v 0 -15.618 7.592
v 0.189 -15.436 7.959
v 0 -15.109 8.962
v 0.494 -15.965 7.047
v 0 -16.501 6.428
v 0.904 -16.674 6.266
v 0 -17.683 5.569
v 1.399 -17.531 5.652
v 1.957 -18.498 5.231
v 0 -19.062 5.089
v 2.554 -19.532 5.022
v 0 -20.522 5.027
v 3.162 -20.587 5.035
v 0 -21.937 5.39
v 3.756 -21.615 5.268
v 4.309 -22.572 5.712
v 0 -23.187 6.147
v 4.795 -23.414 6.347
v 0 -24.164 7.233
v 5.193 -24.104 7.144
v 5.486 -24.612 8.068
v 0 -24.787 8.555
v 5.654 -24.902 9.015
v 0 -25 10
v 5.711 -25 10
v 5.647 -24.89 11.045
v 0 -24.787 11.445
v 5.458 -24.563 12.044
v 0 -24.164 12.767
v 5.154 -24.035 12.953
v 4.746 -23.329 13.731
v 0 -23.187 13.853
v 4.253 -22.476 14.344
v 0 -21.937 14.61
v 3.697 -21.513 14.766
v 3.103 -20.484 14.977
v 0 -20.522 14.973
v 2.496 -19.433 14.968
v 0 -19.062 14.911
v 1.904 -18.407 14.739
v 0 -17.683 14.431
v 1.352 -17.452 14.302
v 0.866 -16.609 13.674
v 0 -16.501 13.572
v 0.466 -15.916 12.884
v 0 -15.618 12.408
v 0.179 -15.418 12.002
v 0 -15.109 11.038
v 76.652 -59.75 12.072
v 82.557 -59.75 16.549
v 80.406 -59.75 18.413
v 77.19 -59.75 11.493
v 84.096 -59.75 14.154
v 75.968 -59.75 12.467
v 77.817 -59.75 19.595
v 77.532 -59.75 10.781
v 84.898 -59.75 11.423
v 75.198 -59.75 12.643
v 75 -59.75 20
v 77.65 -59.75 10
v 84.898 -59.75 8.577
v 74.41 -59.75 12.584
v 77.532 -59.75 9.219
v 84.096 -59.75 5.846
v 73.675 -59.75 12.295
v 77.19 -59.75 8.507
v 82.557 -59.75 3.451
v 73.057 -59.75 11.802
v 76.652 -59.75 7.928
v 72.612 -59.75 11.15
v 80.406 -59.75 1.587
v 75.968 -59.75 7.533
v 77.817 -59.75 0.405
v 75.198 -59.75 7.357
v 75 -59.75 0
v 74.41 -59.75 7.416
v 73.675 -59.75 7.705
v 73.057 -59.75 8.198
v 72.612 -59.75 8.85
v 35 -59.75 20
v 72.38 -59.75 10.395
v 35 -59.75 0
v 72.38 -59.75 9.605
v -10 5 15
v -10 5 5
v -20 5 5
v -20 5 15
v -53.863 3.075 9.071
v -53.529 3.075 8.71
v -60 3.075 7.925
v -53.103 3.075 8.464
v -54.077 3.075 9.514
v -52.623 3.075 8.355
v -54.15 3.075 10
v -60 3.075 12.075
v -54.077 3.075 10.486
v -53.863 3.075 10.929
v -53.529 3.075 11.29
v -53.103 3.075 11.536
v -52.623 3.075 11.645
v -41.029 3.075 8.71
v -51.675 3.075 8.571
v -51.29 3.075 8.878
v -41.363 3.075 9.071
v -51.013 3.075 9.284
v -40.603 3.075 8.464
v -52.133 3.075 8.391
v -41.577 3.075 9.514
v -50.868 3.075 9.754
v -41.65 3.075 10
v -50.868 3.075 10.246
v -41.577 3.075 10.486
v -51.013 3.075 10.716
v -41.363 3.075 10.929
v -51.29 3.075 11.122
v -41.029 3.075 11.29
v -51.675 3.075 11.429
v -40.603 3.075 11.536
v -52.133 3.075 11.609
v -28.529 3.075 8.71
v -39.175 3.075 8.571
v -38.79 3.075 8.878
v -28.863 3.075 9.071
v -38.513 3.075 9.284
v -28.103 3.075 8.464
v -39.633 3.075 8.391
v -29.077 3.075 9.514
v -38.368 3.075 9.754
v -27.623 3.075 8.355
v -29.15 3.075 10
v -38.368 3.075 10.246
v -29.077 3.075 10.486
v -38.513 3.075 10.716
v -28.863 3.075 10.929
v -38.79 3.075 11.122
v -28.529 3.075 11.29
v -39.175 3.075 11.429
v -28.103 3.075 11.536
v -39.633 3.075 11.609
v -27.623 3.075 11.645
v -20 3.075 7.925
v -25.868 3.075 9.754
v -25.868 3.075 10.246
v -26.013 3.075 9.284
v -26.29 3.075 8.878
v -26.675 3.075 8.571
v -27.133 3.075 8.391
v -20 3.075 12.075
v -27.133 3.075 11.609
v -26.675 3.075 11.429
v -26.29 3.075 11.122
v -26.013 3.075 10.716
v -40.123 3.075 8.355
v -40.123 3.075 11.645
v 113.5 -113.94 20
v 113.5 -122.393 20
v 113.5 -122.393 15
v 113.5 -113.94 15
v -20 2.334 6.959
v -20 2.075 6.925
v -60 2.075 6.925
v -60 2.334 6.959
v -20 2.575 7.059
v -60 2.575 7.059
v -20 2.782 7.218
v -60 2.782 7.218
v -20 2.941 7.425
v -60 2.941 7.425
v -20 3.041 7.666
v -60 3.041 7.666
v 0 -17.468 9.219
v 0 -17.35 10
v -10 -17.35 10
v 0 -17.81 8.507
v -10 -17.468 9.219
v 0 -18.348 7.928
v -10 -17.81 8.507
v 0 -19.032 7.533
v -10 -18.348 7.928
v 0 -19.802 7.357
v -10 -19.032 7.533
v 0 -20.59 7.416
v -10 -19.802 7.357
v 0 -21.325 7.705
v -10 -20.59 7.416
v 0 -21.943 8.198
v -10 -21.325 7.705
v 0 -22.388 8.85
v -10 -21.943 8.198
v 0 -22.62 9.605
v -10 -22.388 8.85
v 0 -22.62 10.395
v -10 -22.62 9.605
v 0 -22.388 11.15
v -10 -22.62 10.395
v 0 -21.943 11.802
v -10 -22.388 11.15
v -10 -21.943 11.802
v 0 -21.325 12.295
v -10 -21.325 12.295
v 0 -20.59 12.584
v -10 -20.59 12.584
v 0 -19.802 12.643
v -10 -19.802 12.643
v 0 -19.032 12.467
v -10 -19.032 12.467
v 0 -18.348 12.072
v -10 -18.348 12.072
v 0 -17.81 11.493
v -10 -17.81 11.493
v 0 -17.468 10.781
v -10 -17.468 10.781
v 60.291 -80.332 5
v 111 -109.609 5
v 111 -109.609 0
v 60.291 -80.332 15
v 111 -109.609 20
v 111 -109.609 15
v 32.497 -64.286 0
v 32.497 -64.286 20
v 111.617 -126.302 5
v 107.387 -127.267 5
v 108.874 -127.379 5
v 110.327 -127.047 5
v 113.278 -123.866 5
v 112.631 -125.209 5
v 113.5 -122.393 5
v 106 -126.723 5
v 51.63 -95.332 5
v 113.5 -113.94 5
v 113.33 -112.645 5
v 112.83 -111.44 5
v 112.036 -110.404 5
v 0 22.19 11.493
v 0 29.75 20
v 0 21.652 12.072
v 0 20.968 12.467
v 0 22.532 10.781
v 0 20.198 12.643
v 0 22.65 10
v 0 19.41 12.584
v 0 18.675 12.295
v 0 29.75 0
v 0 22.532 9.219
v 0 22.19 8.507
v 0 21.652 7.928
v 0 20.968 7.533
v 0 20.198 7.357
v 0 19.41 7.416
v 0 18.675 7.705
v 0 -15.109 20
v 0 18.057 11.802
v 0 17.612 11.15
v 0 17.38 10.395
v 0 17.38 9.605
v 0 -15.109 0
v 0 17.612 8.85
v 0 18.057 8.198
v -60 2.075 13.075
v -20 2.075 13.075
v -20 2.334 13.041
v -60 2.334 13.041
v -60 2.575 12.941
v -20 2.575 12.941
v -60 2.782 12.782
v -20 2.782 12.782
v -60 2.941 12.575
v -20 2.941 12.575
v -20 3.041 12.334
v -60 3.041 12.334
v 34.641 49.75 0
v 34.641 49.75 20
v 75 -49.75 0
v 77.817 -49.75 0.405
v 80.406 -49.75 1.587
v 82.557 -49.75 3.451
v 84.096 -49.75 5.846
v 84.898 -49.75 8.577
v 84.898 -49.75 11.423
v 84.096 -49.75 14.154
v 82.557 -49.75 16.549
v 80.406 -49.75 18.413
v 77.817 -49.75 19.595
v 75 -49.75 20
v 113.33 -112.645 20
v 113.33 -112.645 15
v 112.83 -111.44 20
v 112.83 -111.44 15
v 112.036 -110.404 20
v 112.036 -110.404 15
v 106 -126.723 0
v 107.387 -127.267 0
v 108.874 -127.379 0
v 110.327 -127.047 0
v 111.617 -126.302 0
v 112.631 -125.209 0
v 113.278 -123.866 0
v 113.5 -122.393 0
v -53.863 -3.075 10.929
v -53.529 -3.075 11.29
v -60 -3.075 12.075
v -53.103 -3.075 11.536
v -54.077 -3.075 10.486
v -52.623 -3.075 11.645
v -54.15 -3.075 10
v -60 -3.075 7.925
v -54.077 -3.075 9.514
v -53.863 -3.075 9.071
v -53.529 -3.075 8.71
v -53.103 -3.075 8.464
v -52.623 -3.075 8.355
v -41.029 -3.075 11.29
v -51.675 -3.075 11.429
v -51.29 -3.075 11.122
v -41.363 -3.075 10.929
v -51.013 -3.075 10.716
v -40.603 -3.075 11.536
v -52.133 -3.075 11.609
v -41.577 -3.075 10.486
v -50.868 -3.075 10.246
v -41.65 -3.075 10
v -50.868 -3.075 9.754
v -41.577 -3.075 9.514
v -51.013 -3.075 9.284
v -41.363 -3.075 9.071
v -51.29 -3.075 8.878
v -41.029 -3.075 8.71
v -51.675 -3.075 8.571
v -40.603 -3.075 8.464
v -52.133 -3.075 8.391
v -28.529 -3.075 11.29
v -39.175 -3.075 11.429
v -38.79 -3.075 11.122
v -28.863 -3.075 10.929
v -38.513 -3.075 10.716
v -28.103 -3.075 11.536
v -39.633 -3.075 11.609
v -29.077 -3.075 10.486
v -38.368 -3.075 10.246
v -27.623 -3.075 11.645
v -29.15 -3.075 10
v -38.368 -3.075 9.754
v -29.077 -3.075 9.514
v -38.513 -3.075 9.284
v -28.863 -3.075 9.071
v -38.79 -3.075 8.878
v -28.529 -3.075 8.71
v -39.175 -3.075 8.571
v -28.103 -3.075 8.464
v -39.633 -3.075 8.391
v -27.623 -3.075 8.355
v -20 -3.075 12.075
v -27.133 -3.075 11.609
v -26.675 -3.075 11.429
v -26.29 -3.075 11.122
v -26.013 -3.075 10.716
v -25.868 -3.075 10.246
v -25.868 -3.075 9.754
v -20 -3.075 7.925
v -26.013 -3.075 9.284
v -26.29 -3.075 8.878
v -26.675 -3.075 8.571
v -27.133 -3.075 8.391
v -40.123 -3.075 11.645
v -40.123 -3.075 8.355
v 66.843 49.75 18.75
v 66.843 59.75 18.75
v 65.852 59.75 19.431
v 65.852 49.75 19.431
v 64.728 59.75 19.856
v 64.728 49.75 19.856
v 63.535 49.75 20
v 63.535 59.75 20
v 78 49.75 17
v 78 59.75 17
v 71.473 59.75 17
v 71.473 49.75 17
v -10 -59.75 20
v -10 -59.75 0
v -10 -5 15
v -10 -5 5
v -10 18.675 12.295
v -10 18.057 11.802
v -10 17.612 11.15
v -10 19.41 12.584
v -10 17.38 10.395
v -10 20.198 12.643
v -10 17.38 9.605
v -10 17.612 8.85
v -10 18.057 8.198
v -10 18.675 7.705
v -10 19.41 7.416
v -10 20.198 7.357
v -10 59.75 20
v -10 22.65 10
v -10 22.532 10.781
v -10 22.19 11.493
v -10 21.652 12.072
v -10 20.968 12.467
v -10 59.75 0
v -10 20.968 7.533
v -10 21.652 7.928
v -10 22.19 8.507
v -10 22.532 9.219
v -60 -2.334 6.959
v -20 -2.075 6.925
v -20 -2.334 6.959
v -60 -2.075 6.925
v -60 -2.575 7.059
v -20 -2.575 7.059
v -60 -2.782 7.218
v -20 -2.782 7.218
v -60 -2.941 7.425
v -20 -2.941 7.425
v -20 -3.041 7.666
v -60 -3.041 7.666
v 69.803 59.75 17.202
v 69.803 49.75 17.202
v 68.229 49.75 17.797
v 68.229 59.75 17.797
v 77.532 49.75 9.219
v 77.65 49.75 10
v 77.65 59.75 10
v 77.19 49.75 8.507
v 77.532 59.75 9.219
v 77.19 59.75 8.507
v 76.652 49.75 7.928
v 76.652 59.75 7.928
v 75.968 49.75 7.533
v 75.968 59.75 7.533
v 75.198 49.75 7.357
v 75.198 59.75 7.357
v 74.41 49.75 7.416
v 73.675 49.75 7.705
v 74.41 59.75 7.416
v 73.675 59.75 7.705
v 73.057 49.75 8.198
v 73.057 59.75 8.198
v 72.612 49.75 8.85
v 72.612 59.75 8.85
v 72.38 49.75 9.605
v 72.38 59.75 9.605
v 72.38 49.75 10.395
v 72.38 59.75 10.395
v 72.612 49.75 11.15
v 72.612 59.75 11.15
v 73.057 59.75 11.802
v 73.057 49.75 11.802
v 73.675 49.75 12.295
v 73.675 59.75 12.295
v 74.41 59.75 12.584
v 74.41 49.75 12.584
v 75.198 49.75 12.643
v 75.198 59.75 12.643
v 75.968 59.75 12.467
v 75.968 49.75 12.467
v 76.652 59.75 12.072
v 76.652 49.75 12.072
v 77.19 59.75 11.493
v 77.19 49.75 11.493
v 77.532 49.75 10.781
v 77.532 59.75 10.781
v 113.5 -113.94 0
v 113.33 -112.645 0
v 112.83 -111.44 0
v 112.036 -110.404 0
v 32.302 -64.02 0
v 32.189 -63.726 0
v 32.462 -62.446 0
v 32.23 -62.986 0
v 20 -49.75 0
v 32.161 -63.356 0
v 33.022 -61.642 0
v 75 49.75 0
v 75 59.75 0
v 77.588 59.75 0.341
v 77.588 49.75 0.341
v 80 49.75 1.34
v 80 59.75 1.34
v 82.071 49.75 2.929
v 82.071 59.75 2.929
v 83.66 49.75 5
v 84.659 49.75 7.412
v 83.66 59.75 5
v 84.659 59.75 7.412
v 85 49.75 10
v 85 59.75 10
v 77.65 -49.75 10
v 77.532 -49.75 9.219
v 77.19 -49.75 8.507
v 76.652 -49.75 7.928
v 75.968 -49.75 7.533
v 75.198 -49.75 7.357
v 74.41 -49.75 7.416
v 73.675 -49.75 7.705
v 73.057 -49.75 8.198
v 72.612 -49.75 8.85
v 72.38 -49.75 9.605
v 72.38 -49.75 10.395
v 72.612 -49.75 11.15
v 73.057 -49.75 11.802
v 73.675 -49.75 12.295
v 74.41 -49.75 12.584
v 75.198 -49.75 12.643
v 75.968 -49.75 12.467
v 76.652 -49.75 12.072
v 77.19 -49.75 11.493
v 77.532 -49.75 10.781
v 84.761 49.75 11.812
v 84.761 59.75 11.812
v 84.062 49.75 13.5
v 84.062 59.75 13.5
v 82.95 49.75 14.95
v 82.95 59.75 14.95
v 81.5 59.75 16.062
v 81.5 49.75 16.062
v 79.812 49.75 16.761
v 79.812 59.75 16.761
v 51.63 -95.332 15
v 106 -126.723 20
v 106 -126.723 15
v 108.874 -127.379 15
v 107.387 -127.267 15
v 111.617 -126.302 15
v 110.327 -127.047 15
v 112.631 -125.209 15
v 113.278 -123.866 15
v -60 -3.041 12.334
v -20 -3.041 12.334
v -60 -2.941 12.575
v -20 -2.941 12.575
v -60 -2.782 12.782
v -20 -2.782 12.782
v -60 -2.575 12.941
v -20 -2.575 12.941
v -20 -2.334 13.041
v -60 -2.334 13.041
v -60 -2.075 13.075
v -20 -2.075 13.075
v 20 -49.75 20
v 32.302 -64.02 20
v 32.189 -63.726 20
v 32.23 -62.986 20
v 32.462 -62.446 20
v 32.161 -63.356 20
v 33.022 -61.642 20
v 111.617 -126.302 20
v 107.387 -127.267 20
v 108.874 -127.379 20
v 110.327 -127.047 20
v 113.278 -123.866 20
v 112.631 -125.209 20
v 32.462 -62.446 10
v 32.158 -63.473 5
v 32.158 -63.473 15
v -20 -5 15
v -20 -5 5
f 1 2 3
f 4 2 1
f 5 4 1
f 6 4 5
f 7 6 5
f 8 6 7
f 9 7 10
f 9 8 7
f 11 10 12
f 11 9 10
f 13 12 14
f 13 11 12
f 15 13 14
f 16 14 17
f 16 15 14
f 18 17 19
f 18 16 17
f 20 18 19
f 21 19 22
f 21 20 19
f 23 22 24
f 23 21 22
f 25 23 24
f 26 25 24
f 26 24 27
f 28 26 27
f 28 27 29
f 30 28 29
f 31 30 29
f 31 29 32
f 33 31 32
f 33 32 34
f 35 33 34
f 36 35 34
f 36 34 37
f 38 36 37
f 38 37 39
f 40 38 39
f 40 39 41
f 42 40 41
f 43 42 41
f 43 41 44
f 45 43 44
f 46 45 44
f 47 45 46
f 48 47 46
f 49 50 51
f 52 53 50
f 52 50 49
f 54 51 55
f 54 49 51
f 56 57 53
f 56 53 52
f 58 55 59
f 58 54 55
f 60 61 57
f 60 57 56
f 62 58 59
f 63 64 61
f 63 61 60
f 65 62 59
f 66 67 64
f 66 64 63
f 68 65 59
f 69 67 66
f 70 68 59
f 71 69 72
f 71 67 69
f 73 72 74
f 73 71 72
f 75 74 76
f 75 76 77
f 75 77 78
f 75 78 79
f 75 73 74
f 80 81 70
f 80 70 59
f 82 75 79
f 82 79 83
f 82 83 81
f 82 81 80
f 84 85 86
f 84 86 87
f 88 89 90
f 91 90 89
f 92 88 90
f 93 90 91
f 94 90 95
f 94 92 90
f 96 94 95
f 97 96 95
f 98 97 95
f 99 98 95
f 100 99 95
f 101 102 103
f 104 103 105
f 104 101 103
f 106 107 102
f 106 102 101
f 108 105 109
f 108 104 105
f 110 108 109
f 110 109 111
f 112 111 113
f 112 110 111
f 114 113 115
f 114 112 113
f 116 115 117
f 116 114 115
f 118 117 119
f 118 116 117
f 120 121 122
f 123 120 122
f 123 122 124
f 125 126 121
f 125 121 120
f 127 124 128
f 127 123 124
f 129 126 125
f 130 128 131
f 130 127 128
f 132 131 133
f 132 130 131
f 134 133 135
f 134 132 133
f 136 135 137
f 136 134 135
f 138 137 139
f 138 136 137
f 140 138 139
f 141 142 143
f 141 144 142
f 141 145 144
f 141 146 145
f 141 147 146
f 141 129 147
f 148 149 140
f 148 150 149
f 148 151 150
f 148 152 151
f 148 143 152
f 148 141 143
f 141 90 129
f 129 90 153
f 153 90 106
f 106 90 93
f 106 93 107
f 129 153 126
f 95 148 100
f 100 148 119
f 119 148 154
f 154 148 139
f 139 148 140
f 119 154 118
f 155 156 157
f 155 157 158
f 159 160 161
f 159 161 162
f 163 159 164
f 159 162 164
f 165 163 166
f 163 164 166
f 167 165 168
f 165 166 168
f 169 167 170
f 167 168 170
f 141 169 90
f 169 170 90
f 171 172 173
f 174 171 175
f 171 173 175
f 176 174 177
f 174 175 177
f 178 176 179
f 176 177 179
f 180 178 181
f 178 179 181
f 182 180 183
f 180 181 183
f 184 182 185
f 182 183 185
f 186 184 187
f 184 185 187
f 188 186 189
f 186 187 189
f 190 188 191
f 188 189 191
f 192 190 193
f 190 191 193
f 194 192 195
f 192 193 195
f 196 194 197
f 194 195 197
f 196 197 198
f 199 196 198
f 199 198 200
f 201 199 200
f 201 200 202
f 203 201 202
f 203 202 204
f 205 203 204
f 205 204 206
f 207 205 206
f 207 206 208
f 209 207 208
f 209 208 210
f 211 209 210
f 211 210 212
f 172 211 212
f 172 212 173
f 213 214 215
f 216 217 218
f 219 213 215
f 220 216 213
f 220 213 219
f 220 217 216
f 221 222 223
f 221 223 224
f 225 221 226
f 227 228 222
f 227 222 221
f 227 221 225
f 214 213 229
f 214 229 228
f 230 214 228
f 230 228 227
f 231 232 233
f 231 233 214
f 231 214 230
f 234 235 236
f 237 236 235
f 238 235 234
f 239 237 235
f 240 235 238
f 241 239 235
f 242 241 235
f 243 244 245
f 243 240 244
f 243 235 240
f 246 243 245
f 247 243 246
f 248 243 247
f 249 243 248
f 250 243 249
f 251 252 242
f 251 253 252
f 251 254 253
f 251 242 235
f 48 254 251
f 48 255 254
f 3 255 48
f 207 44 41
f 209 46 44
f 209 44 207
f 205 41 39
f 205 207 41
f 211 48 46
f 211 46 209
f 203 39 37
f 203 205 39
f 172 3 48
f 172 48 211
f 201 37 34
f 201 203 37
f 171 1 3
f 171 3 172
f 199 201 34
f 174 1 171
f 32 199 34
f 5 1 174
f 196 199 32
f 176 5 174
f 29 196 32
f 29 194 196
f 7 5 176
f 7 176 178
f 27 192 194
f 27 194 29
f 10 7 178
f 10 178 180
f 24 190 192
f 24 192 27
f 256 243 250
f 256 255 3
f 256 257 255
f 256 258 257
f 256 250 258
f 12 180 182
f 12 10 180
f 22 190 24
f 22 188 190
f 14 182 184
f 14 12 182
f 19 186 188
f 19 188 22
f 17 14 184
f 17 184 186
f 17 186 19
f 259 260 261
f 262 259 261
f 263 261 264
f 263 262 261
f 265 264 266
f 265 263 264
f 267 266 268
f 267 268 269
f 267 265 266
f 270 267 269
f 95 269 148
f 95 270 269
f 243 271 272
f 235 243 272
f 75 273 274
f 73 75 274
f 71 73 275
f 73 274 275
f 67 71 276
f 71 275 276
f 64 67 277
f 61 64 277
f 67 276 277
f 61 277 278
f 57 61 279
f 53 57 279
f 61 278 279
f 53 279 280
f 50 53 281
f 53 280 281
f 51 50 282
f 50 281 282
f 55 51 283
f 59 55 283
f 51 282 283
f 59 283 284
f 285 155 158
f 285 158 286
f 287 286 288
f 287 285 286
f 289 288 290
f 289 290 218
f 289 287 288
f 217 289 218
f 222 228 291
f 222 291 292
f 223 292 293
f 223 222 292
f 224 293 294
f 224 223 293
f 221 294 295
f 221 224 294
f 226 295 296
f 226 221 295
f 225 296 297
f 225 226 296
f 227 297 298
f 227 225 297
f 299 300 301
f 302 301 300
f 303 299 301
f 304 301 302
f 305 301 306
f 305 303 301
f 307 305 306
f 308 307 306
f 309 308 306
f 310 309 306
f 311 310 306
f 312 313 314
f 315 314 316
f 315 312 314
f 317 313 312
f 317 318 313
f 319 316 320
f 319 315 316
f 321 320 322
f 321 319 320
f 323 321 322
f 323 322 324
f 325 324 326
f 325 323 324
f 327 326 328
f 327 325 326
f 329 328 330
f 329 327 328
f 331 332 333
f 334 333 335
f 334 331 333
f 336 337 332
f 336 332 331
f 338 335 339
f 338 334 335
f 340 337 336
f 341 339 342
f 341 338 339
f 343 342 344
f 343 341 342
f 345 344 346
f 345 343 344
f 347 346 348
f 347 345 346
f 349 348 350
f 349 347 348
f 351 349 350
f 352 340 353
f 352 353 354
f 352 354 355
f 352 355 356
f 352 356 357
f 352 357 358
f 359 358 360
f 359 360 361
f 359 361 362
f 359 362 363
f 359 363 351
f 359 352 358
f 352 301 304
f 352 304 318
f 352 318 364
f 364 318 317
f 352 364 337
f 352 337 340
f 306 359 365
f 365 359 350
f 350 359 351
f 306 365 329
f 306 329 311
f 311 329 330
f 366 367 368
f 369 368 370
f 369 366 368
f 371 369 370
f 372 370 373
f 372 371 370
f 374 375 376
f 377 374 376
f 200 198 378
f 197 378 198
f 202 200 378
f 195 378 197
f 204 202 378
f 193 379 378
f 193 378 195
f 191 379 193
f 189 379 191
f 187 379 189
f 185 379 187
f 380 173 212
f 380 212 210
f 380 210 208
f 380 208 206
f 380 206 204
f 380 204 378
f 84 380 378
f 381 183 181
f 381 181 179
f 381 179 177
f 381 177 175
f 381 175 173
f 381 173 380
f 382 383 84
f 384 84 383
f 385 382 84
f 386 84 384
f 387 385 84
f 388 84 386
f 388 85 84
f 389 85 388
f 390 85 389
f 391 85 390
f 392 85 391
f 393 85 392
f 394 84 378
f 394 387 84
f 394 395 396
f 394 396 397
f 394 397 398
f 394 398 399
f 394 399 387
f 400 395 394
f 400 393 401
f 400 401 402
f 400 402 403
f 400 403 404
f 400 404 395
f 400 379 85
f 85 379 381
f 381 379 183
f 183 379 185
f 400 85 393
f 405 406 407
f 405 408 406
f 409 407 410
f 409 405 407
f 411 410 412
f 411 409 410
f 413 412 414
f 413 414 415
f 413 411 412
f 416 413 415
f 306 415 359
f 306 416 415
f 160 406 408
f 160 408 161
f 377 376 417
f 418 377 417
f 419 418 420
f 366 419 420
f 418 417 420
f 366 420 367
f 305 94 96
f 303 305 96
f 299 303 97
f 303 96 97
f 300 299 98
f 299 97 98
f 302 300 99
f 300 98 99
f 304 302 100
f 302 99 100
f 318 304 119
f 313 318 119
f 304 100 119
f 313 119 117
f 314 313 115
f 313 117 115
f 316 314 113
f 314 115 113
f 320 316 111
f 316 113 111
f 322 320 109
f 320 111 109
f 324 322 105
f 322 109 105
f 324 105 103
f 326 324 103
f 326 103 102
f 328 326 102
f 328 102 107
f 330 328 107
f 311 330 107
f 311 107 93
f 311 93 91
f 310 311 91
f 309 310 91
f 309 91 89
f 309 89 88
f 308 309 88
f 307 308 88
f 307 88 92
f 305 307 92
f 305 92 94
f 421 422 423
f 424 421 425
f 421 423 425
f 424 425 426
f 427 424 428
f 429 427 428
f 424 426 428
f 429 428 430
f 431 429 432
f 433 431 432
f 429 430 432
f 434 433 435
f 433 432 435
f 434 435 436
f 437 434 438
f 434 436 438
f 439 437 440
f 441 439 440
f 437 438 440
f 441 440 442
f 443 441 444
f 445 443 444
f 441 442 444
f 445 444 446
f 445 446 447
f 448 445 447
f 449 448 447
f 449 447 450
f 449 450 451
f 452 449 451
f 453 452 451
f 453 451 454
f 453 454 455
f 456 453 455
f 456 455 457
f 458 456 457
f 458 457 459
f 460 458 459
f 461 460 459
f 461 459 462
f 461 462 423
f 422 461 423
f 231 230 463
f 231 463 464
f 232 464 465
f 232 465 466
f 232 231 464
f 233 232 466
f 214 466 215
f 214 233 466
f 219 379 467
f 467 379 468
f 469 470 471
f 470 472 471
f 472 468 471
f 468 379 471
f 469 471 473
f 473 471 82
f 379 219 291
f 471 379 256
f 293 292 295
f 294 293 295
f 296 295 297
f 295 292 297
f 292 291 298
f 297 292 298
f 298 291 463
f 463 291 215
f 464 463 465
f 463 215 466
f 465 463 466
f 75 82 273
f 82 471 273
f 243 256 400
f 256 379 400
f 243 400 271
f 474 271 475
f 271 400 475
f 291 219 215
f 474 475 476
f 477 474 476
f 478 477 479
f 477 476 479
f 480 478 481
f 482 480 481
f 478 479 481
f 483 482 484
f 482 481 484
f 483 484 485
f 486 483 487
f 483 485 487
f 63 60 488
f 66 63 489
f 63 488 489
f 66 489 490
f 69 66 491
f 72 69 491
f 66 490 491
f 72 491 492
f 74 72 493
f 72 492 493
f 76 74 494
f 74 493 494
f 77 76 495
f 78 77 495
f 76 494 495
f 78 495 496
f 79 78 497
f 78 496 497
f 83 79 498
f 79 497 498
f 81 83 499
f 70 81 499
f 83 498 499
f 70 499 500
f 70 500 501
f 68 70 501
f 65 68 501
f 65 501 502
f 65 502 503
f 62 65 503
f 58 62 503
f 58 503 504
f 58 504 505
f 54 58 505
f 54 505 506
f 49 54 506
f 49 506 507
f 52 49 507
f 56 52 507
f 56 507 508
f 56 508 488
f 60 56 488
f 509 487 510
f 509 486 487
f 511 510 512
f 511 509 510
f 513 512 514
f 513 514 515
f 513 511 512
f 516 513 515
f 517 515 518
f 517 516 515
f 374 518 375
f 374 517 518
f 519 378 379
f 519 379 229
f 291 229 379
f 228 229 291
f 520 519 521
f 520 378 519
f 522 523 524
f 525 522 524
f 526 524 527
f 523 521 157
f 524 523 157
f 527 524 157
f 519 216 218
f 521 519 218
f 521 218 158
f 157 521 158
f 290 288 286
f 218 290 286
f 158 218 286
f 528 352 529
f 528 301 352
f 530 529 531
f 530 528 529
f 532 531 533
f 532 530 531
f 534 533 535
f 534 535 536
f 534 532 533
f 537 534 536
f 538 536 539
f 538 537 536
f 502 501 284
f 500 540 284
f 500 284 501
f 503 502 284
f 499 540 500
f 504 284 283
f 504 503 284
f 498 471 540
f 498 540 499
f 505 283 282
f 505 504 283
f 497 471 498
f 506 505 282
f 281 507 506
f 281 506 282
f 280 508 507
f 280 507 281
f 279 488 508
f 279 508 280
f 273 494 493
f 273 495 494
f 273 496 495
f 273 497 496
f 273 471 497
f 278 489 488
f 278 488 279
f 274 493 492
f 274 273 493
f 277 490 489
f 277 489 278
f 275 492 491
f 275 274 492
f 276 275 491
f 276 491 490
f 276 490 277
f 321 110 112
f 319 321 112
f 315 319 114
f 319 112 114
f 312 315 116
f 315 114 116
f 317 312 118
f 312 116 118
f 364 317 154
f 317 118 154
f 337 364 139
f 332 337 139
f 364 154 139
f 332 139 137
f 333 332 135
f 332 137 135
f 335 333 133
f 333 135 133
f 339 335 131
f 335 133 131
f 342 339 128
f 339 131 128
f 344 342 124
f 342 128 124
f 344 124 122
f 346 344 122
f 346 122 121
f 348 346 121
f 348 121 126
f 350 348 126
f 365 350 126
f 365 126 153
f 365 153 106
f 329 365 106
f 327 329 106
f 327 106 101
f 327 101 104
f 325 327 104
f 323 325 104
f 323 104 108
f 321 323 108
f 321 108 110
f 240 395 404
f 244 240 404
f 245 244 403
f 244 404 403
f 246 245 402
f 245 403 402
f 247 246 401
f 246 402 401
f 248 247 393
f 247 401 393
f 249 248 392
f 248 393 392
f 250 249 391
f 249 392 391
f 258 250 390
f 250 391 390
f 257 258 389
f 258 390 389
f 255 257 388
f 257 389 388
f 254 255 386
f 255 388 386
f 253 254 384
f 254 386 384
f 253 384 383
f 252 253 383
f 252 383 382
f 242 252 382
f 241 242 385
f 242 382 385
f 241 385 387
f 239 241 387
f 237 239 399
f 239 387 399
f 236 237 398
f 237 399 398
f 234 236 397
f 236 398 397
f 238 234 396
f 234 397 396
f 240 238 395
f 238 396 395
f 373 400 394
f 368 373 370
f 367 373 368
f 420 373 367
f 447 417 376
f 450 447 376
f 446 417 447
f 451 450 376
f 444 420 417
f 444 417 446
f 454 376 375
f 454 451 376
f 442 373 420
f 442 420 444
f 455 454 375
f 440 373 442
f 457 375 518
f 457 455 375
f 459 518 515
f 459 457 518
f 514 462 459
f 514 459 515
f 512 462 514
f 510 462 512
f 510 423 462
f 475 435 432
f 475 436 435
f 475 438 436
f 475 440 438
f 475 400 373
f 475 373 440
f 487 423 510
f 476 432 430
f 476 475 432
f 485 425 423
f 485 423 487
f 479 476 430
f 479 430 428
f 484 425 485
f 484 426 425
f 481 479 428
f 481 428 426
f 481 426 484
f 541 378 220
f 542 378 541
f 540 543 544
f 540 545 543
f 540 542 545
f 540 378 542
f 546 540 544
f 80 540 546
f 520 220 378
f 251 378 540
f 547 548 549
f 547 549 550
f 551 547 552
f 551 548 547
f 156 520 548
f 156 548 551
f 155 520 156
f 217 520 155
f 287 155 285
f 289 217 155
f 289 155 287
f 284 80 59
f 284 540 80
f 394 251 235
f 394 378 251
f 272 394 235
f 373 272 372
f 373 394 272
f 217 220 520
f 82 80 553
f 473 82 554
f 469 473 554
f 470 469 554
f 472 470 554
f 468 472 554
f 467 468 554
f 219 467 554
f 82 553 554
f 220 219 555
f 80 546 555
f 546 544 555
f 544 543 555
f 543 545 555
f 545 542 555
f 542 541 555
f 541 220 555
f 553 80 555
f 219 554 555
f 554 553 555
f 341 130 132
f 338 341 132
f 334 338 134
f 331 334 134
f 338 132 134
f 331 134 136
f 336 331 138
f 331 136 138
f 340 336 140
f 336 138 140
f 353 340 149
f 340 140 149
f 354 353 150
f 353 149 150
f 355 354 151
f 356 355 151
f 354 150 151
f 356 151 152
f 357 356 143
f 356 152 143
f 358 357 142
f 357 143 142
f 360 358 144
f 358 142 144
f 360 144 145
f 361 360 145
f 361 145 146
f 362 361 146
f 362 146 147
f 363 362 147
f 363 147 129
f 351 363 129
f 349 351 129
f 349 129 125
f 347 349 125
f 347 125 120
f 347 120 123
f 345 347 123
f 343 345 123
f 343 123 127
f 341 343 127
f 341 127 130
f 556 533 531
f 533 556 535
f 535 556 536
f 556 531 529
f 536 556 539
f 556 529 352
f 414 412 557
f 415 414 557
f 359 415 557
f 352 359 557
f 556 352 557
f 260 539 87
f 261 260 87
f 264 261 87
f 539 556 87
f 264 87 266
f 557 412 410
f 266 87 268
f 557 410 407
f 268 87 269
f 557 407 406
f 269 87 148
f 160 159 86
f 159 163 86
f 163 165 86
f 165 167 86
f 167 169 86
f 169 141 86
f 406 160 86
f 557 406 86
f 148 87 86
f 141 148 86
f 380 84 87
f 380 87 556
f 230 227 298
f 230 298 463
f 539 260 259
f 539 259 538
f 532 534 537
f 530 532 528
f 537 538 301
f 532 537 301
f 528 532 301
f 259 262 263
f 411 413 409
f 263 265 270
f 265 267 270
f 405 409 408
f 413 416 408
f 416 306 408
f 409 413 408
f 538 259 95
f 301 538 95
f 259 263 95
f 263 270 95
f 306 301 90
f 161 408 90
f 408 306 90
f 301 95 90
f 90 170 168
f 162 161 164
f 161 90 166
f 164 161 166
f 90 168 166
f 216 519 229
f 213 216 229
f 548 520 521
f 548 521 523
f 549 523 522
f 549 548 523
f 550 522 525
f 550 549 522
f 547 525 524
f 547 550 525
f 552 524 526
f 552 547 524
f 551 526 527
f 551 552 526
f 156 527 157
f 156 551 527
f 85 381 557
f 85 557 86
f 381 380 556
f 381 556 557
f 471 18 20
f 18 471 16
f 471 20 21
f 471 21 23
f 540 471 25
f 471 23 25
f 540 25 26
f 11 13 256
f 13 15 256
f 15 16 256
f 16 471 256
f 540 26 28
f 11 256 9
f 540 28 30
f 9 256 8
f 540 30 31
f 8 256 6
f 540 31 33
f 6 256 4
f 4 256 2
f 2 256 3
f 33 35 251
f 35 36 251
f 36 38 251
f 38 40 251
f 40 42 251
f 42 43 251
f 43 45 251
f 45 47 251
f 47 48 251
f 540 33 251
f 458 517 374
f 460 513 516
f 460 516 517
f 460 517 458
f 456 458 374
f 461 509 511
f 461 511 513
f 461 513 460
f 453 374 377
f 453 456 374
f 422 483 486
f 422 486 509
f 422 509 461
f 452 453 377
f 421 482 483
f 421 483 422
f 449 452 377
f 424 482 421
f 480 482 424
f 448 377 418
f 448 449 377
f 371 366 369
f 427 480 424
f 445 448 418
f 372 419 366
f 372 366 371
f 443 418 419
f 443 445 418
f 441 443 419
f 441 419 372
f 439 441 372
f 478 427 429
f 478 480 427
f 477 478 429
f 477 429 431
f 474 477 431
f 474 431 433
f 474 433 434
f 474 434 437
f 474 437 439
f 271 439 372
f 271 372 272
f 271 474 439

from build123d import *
from OCP.BRepFilletAPI import BRepFilletAPI_MakeChamfer, BRepFilletAPI_MakeFillet

# Parameters (mm, degrees)
EXTRUDE_1_DEPTH     = 20
EXTRUDE_2_DEPTH     = 10
EXTRUDE_START       = 10
EXTRUDE_3_DEPTH     = 40
CUT_EXTRUDE_1_DEPTH = 149.00422291272636
FILLET_1_R          = 1
SKETCH_7_R          = 1.6500000000000021
SKETCH_7_R_2        = 1.6499999999999988
CUT_EXTRUDE_2_DEPTH = 108.57314081591156
CHAMFER_1_SIZE      = 20.000000000000007
CHAMFER_1_SIZE2     = 34.64101615137772
CUT_EXTRUDE_3_REACH = 150.004
FILLET_2_R1         = 5
FILLET_2_R2         = 7
CUT_EXTRUDE_4_REACH = 115.996
CUT_EXTRUDE_START   = -15.710581
CUT_EXTRUDE_5_DEPTH = 5.7105809999999995
BOSS_EXTRUDE1_DEPTH = 20.000000000000004
SKETCH4_W           = 72.89110280441945
SKETCH4_H           = 10.000000000000005
CUT_EXTRUDE1_DEPTH  = 29.000000000000004


with BuildPart() as part:
    # 草图1 → 凸台-拉伸1 (new body)
    with BuildSketch(Plane.XY):
        Polygon((-1.953e-14, 49.75), (1.093e-14, -49.75), (85.00000000000001, -49.74999999999995), (85.00000000000001, -59.74999999999995), (-9.999999999999986, -59.74999999999995), (-9.999999999999995, 59.749999999999986), (85, 59.75000000000001), (84.99999999999999, 49.75), align=None)
    extrude(amount=EXTRUDE_1_DEPTH)

    # 草图3 → 凸台-拉伸2 (add)
    # profile 1 of 2: a face of its own
    with BuildSketch(Plane.ZY.offset(9.99999999999999)):
        Polygon((15, 5.000000000000008), (15, -4.999999999999993), (5.000000000000002, -4.999999999999993), (5, 5.000000000000007), align=None)
        Polygon((6.925000000000001, 3.075000000000007), (6.925000000000002, -3.074999999999993), (13.075, -3.074999999999993), (13.075, 3.075000000000007), align=None, mode=Mode.SUBTRACT)
    # profile 2 of 2: a face of its own
    with BuildSketch(Plane.ZY.offset(9.99999999999999)):
        Polygon((6.925000000000001, 3.075000000000007), (13.075, 3.075000000000007), (13.075, -3.074999999999993), (6.925000000000002, -3.074999999999993), align=None)
    extrude(amount=EXTRUDE_2_DEPTH)

    # 草图3<3> → 凸台-拉伸3 (add)
    with BuildSketch(Plane.ZY.offset(9.99999999999999).offset(EXTRUDE_START)):
        Polygon((6.925000000000001, 3.075000000000007), (13.075, 3.075000000000007), (13.075, -3.074999999999993), (6.925000000000002, -3.074999999999993), align=None)
    extrude(amount=EXTRUDE_3_DEPTH)

    # 草图5 → 切除-拉伸1 (cut, through all)
    with BuildSketch(Plane(origin=(-1.309e-14, 59.749999999999986, 0), x_dir=(1, 2.3e-16, 0), z_dir=(-2.3e-16, 1, 0))):
        with BuildLine():
            ThreePointArc((72.34999999999964, -10), (74.99999999999964, -12.65), (77.64999999999965, -10))
            Line((77.64999999999965, -9.99999999999999), (72.34999999999964, -9.999999999999991))
        make_face()
        with BuildLine():
            Line((72.34999999999964, -9.999999999999991), (77.64999999999965, -9.99999999999999))
            ThreePointArc((77.64999999999965, -10), (74.99999999999964, -7.35), (72.34999999999964, -9.999999999999998))
        make_face()
        with BuildLine():
            Line((85.00000000000001, -20), (85.00000000000001, -9.999999999999995))
            ThreePointArc((84.99999999999964, -10.000000000000002), (82.07106781186489, -17.071067811865692), (74.99999999999903, -19.999999999999993))
            Line((74.99999999999903, -20), (85.00000000000001, -20))
        make_face()
        with BuildLine():
            ThreePointArc((74.99999999999908, -5.33e-15), (82.07106781186492, -2.928932188134328), (84.99999999999964, -10))
            Line((85.00000000000001, -9.999999999999995), (85.00000000000001, 0))
            Line((85.00000000000001, 0), (74.99999999999908, 0))
        make_face()
    extrude(amount=-CUT_EXTRUDE_1_DEPTH, mode=Mode.SUBTRACT)

    # 圆角1
    fillet_1_edges = [part.edges().sort_by_distance(p)[0] for p in [
        (-39.999999999999986, -3.0749999999999953, 6.925000000000002),
        (-39.999999999999986, -3.0749999999999953, 13.075),
        (-39.999999999999986, 3.0750000000000046, 13.075),
        (-39.999999999999986, 3.0750000000000046, 6.925000000000001),
    ]]
    fillet(fillet_1_edges, radius=FILLET_1_R)

    # 草图7 → 切除-拉伸2 (cut, through all)
    with BuildSketch(Plane(origin=(-1.6e-16, 3.0750000000000064, 0), x_dir=(1, 5e-17, 0), z_dir=(-5e-17, 1, 0))):
        with Locations(Location((-39.99999999999999, -10, 0), (0, 0, 180))):
            Circle(SKETCH_7_R)
        with Locations(Location((-52.49999999999999, -10.000000000000002, 0), (0, 0, 180))):
            Circle(SKETCH_7_R)
        with Locations(Location((-27.499999999999993, -9.999999999999998, 0), (0, 0, 180))):
            Circle(SKETCH_7_R_2)
    extrude(amount=-CUT_EXTRUDE_2_DEPTH, mode=Mode.SUBTRACT)

    # 倒角1: one chamfer whose edges measure the first distance from different faces: ONE call of the kernel's chamfer builder (chamfer() names one face for all edges)
    chamfer_1_edges_1 = [part.edges().sort_by_distance(p)[0] for p in [
        (-1.953e-14, 49.75, 10),
    ]]
    chamfer_1_side_1 = [part.faces().sort_by_distance(p)[0] for p in [
        (-4.3e-15, -1.94e-15, 10),
    ]]
    chamfer_1_edges_2 = [part.edges().sort_by_distance(p)[0] for p in [
        (1.093e-14, -49.75, 10),
    ]]
    chamfer_1_side_2 = [part.faces().sort_by_distance(p)[0] for p in [
        (41.004447540474715, -49.74999999999998, 9.99999999999999),
    ]]
    chamfer_1 = BRepFilletAPI_MakeChamfer(part.part.solid().wrapped)
    for e in chamfer_1_edges_1:
        chamfer_1.Add(CHAMFER_1_SIZE, CHAMFER_1_SIZE2, e.wrapped, chamfer_1_side_1[0].wrapped)  # the first distance lies on this face
    for e in chamfer_1_edges_2:
        chamfer_1.Add(CHAMFER_1_SIZE, CHAMFER_1_SIZE2, e.wrapped, chamfer_1_side_2[0].wrapped)  # the first distance lies on this face
    add(Compound.cast(chamfer_1.Shape()), mode=Mode.REPLACE)

    # 草图8 → 切除-拉伸3 (cut, up to next)
    with BuildSketch(Plane(origin=(-1.309e-14, 59.749999999999986, 0), x_dir=(1, 2.2e-16, 0), z_dir=(-2.2e-16, 1, 0)), mode=Mode.PRIVATE) as cut_extrude_3_sk1:
        with BuildLine():
            ThreePointArc((74.99999999999964, -20), (78.87298334620706, -19.219544457292884), (82.14142842854251, -16.99999999999999))
            Line((82.14142842854251, -16.999999999999993), (71.47264625833486, -16.999999999999993))
            ThreePointArc((71.47264625833486, -16.999999999999993), (68.23227590913093, -17.795163177004564), (65.72808361179683, -20.000000000000007))
            Line((65.72808361179683, -20), (74.99999999999964, -20))
        make_face()
    cut_extrude_3_tool1 = extrude(cut_extrude_3_sk1.sketch, amount=-CUT_EXTRUDE_3_REACH, mode=Mode.PRIVATE) & part.part
    add(cut_extrude_3_tool1.solids().sort_by_distance((73.723085, 59.75, 18.477053))[0], mode=Mode.SUBTRACT)

    # 圆角2: one fillet with a radius per group of edges: ONE call of the kernel's fillet builder (fillet() takes one radius for all edges)
    fillet_2_edges_1 = [part.edges().sort_by_distance(p)[0] for p in [
        (65.72808361179682, 54.75, 20.000000000000004),
    ]]
    fillet_2_edges_2 = [part.edges().sort_by_distance(p)[0] for p in [
        (82.1414284285425, 54.75, 16.999999999999993),
    ]]
    fillet_2 = BRepFilletAPI_MakeFillet(part.part.solid().wrapped)
    for e in fillet_2_edges_1:
        fillet_2.Add(FILLET_2_R1, e.wrapped)
    for e in fillet_2_edges_2:
        fillet_2.Add(FILLET_2_R2, e.wrapped)
    add(Compound.cast(fillet_2.Shape()), mode=Mode.REPLACE)

    # 草图10 → 切除-拉伸4 (cut, up to next)
    with BuildSketch(Plane.ZY.offset(9.99999999999999), mode=Mode.PRIVATE) as cut_extrude_4_sk1:
        with BuildLine():
            ThreePointArc((12.649999999999984, 20.00000000000003), (11.873832970144308, 21.873832970144406), (9.999999999999908, 22.650000000000027))
            Line((9.999999999999988, 22.650000000000027), (9.999999999999988, 20.00000000000003))
            Line((9.999999999999988, 20.00000000000003), (9.99999999999999, 17.35000000000003))
            ThreePointArc((9.999999999999908, 17.35000000000003), (11.873832970144308, 18.12616702985565), (12.649999999999984, 20.00000000000003))
        make_face()
    cut_extrude_4_tool1 = extrude(cut_extrude_4_sk1.sketch, amount=-CUT_EXTRUDE_4_REACH, mode=Mode.PRIVATE) & part.part
    # 草图10 → 切除-拉伸4 (cut, up to next)
    with BuildSketch(Plane.ZY.offset(9.99999999999999), mode=Mode.PRIVATE) as cut_extrude_4_sk2:
        with BuildLine():
            Line((9.999999999999988, 20.00000000000003), (9.999999999999988, 22.650000000000027))
            ThreePointArc((9.999999999999908, 22.650000000000027), (7.349999999999984, 20.00000000000003), (9.999999999999908, 17.35000000000003))
            Line((9.99999999999999, 17.35000000000003), (9.999999999999988, 20.00000000000003))
        make_face()
    cut_extrude_4_tool2 = extrude(cut_extrude_4_sk2.sketch, amount=-CUT_EXTRUDE_4_REACH, mode=Mode.PRIVATE) & part.part
    # 草图10 → 切除-拉伸4 (cut, up to next)
    with BuildSketch(Plane.ZY.offset(9.99999999999999), mode=Mode.PRIVATE) as cut_extrude_4_sk3:
        with BuildLine():
            ThreePointArc((12.649999999999984, 20.00000000000003), (11.873832970144308, 21.873832970144406), (9.999999999999908, 22.650000000000027))
            Line((9.999999999999988, 22.650000000000027), (9.999999999999988, 20.00000000000003))
            Line((9.999999999999988, 20.00000000000003), (9.99999999999999, 17.35000000000003))
            ThreePointArc((9.999999999999908, 17.35000000000003), (11.873832970144308, 18.12616702985565), (12.649999999999984, 20.00000000000003))
        make_face()
    cut_extrude_4_tool3 = extrude(cut_extrude_4_sk3.sketch, amount=-CUT_EXTRUDE_4_REACH, mode=Mode.PRIVATE) & part.part
    # 草图10 → 切除-拉伸4 (cut, up to next)
    with BuildSketch(Plane.ZY.offset(9.99999999999999), mode=Mode.PRIVATE) as cut_extrude_4_sk4:
        with BuildLine():
            Line((9.999999999999988, 20.00000000000003), (9.999999999999988, 22.650000000000027))
            ThreePointArc((9.999999999999908, 22.650000000000027), (7.349999999999984, 20.00000000000003), (9.999999999999908, 17.35000000000003))
            Line((9.99999999999999, 17.35000000000003), (9.999999999999988, 20.00000000000003))
        make_face()
    cut_extrude_4_tool4 = extrude(cut_extrude_4_sk4.sketch, amount=-CUT_EXTRUDE_4_REACH, mode=Mode.PRIVATE) & part.part
    # 草图10 → 切除-拉伸4 (cut, up to next)
    with BuildSketch(Plane.ZY.offset(9.99999999999999), mode=Mode.PRIVATE) as cut_extrude_4_sk5:
        with BuildLine():
            ThreePointArc((12.649999999999997, -19.99999999999997), (11.873832970144319, -18.12616702985559), (9.999999999999915, -17.349999999999973))
            Line((9.999999999999993, -17.349999999999966), (9.999999999999995, -19.99999999999997))
            Line((9.999999999999995, -19.99999999999997), (9.999999999999995, -22.649999999999977))
            ThreePointArc((9.999999999999917, -22.64999999999997), (11.873832970144319, -21.873832970144353), (12.649999999999997, -19.99999999999997))
        make_face()
    cut_extrude_4_tool5 = extrude(cut_extrude_4_sk5.sketch, amount=-CUT_EXTRUDE_4_REACH, mode=Mode.PRIVATE) & part.part
    # 草图10 → 切除-拉伸4 (cut, up to next)
    with BuildSketch(Plane.ZY.offset(9.99999999999999), mode=Mode.PRIVATE) as cut_extrude_4_sk6:
        with BuildLine():
            Line((9.999999999999995, -19.99999999999997), (9.999999999999993, -17.349999999999966))
            ThreePointArc((9.999999999999915, -17.349999999999973), (7.349999999999996, -19.99999999999997), (9.999999999999917, -22.64999999999997))
            Line((9.999999999999995, -22.649999999999977), (9.999999999999995, -19.99999999999997))
        make_face()
    cut_extrude_4_tool6 = extrude(cut_extrude_4_sk6.sketch, amount=-CUT_EXTRUDE_4_REACH, mode=Mode.PRIVATE) & part.part
    # 草图10 → 切除-拉伸4 (cut, up to next)
    with BuildSketch(Plane.ZY.offset(9.99999999999999), mode=Mode.PRIVATE) as cut_extrude_4_sk7:
        with BuildLine():
            ThreePointArc((12.649999999999997, -19.99999999999997), (11.873832970144319, -18.12616702985559), (9.999999999999915, -17.349999999999973))
            Line((9.999999999999993, -17.349999999999966), (9.999999999999995, -19.99999999999997))
            Line((9.999999999999995, -19.99999999999997), (9.999999999999995, -22.649999999999977))
            ThreePointArc((9.999999999999917, -22.64999999999997), (11.873832970144319, -21.873832970144353), (12.649999999999997, -19.99999999999997))
        make_face()
    cut_extrude_4_tool7 = extrude(cut_extrude_4_sk7.sketch, amount=-CUT_EXTRUDE_4_REACH, mode=Mode.PRIVATE) & part.part
    # 草图10 → 切除-拉伸4 (cut, up to next)
    with BuildSketch(Plane.ZY.offset(9.99999999999999), mode=Mode.PRIVATE) as cut_extrude_4_sk8:
        with BuildLine():
            Line((9.999999999999995, -19.99999999999997), (9.999999999999993, -17.349999999999966))
            ThreePointArc((9.999999999999915, -17.349999999999973), (7.349999999999996, -19.99999999999997), (9.999999999999917, -22.64999999999997))
            Line((9.999999999999995, -22.649999999999977), (9.999999999999995, -19.99999999999997))
        make_face()
    cut_extrude_4_tool8 = extrude(cut_extrude_4_sk8.sketch, amount=-CUT_EXTRUDE_4_REACH, mode=Mode.PRIVATE) & part.part
    add(cut_extrude_4_tool1.solids().sort_by_distance((-10, 20, 11.124695))[0], mode=Mode.SUBTRACT)
    add(cut_extrude_4_tool2.solids().sort_by_distance((-10, 20, 8.875305))[0], mode=Mode.SUBTRACT)
    add(cut_extrude_4_tool3.solids().sort_by_distance((-10, 20, 11.124695))[0], mode=Mode.SUBTRACT)
    add(cut_extrude_4_tool4.solids().sort_by_distance((-10, 20, 8.875305))[0], mode=Mode.SUBTRACT)
    add(cut_extrude_4_tool5.solids().sort_by_distance((-10, -20, 11.124695))[0], mode=Mode.SUBTRACT)
    add(cut_extrude_4_tool6.solids().sort_by_distance((-10, -20, 8.875305))[0], mode=Mode.SUBTRACT)
    add(cut_extrude_4_tool7.solids().sort_by_distance((-10, -20, 11.124695))[0], mode=Mode.SUBTRACT)
    add(cut_extrude_4_tool8.solids().sort_by_distance((-10, -20, 8.875305))[0], mode=Mode.SUBTRACT)

    # 草图10<3> → 切除-拉伸5 (cut)
    with BuildSketch(Plane.ZY.offset(9.99999999999999).offset(CUT_EXTRUDE_START)):
        with BuildLine():
            ThreePointArc((14.999999999999996, -19.99999999999997), (13.535533905932759, -16.46446609406726), (10.000000000000064, -14.999999999999972))
            Line((9.999999999999993, -14.999999999999972), (9.999999999999993, -17.349999999999966))
            ThreePointArc((9.999999999999915, -17.349999999999973), (11.873832970144319, -18.12616702985559), (12.649999999999997, -19.99999999999997))
            ThreePointArc((12.649999999999997, -19.99999999999997), (11.873832970144319, -21.873832970144353), (9.999999999999917, -22.64999999999997))
            Line((9.999999999999995, -22.649999999999977), (9.999999999999995, -24.99999999999997))
            ThreePointArc((10.000000000000057, -24.99999999999997), (13.535533905932756, -23.535533905932688), (14.999999999999996, -19.99999999999997))
        make_face()
        with BuildLine():
            Line((9.999999999999993, -17.349999999999966), (9.999999999999993, -14.999999999999972))
            ThreePointArc((10.000000000000064, -14.999999999999972), (4.999999999999996, -19.999999999999968), (10.000000000000057, -24.99999999999997))
            Line((9.999999999999995, -24.99999999999997), (9.999999999999995, -22.649999999999977))
            ThreePointArc((9.999999999999917, -22.64999999999997), (7.349999999999996, -19.99999999999997), (9.999999999999915, -17.349999999999973))
        make_face()
    extrude(amount=CUT_EXTRUDE_5_DEPTH, mode=Mode.SUBTRACT)

    # Sketch1 → Boss-Extrude1 (add)
    with BuildSketch(Plane.XY.offset(20)):
        with BuildLine():
            Line((-9.999999999999986, -59.74999999999996), (106.00000000000001, -126.7226312259967))
            ThreePointArc((106.00000000000001, -126.7226312259967), (111.00000000000001, -126.72263122599672), (113.50000000000001, -122.39250420707452))
            Line((113.50000000000001, -122.39250420707452), (113.5, -113.939509590867))
            ThreePointArc((113.5, -113.939509590867), (112.8301270189222, -111.439509590867), (111, -109.60938257194482))
            Line((111, -109.60938257194482), (32.49747535530764, -64.28592883626634))
            add(Edge.make_bspline(
                [(35.00000000000001, -59.74999999999995), (31.175910828961968, -62.87321170356669), (32.49747535530764, -64.28592883626634)],
                knots=[0, 0, 0, 1, 1, 1], degree=2))
            Line((35.00000000000001, -59.74999999999995), (-9.999999999999986, -59.74999999999996))
        make_face()
    extrude(amount=-BOSS_EXTRUDE1_DEPTH)

    # Sketch4 → Cut-Extrude1 (cut)
    with BuildSketch(Plane(origin=(-19.71225490021572, -34.14262701892212, 0), x_dir=(0.8660254037844382, -0.500000000000001, 0), z_dir=(0.5000000000000009, 0.866025403784438, 0))):
        with Locations((128.82497002974355, -10)):
            Rectangle(SKETCH4_W, SKETCH4_H)
    extrude(amount=-CUT_EXTRUDE1_DEPTH, mode=Mode.SUBTRACT)


solid = part.part
